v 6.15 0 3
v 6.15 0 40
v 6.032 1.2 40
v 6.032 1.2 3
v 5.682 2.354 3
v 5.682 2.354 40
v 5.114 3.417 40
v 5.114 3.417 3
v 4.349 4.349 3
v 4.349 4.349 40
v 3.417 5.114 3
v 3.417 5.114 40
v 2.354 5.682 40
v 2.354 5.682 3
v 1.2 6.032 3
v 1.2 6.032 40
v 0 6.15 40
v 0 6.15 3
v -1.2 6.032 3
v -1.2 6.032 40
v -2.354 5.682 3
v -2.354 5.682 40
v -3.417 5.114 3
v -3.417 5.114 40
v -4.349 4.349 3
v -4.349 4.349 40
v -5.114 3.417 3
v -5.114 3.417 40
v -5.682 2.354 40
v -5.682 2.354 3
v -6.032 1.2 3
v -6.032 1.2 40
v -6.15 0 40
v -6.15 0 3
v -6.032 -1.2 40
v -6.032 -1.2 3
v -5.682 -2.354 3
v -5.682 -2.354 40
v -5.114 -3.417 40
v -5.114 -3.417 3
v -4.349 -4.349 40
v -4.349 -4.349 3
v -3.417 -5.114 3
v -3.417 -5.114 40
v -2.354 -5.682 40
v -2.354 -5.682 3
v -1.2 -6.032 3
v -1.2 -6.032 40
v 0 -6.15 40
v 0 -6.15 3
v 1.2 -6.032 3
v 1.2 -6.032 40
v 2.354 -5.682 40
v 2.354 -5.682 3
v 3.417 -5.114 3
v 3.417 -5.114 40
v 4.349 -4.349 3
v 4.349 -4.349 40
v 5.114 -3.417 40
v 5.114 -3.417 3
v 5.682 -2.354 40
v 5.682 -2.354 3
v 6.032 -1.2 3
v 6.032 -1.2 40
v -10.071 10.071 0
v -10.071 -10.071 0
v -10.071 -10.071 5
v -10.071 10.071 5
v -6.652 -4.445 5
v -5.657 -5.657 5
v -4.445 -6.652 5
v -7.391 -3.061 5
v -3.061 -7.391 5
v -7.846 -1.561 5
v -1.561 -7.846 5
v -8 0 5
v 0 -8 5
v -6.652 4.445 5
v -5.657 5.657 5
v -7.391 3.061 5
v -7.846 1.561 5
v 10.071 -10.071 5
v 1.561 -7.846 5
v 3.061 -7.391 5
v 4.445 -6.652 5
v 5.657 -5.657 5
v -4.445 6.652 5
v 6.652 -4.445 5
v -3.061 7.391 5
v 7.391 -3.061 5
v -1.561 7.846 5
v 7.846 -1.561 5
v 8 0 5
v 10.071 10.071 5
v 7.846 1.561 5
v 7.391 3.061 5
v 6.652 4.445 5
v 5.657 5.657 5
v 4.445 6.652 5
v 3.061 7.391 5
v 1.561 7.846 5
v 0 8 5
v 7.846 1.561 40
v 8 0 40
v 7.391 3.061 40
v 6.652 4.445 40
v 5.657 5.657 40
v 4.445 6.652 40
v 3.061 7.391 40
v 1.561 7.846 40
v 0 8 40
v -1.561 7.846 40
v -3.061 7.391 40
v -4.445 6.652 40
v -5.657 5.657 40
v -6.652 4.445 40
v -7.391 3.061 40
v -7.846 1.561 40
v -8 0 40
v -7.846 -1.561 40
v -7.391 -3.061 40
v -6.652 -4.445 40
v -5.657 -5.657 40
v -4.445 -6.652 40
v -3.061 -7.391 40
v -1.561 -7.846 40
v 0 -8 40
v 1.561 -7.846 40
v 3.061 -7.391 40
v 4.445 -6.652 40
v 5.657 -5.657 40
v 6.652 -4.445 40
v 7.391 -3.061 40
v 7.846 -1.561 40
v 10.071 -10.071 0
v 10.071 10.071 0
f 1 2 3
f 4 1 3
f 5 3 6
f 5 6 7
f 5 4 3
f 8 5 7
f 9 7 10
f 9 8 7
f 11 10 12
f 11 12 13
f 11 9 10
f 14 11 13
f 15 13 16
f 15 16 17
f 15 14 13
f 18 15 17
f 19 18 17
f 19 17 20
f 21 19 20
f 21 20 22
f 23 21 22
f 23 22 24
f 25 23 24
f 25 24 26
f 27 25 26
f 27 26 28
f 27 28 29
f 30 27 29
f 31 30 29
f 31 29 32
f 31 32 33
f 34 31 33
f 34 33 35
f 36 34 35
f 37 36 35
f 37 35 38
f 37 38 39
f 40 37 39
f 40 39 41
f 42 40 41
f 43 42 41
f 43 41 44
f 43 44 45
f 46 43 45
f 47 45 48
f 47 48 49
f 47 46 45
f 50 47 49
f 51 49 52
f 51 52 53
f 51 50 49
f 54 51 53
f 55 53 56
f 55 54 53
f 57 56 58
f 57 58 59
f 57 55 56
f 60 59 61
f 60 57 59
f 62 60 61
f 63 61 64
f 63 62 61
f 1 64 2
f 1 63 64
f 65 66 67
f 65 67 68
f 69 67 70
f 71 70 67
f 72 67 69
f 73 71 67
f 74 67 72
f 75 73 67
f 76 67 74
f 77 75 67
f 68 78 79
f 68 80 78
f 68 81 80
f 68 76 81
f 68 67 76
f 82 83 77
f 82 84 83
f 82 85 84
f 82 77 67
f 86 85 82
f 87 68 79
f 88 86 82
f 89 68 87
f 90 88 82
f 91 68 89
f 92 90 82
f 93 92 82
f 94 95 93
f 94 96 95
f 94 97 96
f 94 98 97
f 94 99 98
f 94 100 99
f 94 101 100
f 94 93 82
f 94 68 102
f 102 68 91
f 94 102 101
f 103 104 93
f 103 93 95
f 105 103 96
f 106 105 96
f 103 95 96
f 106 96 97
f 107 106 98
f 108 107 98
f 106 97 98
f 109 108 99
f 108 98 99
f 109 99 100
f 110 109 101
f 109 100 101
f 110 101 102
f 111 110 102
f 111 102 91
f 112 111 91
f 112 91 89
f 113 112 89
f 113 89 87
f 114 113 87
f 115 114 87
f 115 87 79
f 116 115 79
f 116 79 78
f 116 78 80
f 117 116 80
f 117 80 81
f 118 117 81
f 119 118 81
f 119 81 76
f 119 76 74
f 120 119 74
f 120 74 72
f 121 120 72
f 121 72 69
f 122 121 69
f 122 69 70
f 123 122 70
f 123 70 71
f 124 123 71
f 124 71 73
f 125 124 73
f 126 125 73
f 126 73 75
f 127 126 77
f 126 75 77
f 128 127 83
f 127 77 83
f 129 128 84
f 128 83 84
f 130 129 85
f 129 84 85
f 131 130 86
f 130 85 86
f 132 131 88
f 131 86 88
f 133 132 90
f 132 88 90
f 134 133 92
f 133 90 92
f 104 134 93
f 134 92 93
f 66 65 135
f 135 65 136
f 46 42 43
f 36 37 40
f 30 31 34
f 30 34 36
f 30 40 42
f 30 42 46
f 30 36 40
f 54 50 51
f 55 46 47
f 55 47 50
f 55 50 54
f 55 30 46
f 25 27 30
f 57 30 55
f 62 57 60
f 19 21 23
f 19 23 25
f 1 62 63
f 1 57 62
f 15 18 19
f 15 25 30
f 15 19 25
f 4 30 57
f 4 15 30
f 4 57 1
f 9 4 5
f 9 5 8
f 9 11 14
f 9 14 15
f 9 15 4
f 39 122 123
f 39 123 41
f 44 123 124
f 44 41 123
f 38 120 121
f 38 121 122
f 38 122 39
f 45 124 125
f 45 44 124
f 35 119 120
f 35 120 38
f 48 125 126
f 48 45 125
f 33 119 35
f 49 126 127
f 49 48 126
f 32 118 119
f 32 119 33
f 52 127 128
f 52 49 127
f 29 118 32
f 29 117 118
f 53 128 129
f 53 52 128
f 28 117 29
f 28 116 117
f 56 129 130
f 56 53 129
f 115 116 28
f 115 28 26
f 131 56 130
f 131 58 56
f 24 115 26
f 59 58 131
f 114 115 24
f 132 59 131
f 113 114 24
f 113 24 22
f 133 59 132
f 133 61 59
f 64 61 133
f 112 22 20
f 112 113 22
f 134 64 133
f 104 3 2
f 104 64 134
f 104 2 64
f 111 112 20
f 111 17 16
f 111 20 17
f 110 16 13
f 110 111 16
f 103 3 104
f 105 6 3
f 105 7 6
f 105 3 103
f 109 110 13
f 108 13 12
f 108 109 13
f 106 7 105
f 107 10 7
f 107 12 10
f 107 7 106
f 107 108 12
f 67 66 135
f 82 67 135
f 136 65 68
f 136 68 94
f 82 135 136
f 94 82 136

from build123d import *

# Parameters (mm, degrees)
F0_W     = 20.141244
F0_H     = 20.141244
F0_R     = 8
F1_DEPTH = 5
F0_R_2   = 6.15
F2_DEPTH = 40
F3_DEPTH = 3


with BuildPart() as f1:
    # F0 (on Top) → F1 (new body)
    with BuildSketch(Plane.XY):
        Rectangle(F0_W, F0_H)
        Circle(F0_R, mode=Mode.SUBTRACT)
    extrude(amount=F1_DEPTH)

    # F0 (on Top) → F2 (join)
    with BuildSketch(Plane.XY):
        Circle(F0_R)
        Circle(F0_R_2, mode=Mode.SUBTRACT)
    extrude(amount=F2_DEPTH)

    # F0 (on Top) → F3 (join)
    with BuildSketch(Plane.XY):
        Circle(F0_R_2)
    extrude(amount=F3_DEPTH)


solid = f1.part
